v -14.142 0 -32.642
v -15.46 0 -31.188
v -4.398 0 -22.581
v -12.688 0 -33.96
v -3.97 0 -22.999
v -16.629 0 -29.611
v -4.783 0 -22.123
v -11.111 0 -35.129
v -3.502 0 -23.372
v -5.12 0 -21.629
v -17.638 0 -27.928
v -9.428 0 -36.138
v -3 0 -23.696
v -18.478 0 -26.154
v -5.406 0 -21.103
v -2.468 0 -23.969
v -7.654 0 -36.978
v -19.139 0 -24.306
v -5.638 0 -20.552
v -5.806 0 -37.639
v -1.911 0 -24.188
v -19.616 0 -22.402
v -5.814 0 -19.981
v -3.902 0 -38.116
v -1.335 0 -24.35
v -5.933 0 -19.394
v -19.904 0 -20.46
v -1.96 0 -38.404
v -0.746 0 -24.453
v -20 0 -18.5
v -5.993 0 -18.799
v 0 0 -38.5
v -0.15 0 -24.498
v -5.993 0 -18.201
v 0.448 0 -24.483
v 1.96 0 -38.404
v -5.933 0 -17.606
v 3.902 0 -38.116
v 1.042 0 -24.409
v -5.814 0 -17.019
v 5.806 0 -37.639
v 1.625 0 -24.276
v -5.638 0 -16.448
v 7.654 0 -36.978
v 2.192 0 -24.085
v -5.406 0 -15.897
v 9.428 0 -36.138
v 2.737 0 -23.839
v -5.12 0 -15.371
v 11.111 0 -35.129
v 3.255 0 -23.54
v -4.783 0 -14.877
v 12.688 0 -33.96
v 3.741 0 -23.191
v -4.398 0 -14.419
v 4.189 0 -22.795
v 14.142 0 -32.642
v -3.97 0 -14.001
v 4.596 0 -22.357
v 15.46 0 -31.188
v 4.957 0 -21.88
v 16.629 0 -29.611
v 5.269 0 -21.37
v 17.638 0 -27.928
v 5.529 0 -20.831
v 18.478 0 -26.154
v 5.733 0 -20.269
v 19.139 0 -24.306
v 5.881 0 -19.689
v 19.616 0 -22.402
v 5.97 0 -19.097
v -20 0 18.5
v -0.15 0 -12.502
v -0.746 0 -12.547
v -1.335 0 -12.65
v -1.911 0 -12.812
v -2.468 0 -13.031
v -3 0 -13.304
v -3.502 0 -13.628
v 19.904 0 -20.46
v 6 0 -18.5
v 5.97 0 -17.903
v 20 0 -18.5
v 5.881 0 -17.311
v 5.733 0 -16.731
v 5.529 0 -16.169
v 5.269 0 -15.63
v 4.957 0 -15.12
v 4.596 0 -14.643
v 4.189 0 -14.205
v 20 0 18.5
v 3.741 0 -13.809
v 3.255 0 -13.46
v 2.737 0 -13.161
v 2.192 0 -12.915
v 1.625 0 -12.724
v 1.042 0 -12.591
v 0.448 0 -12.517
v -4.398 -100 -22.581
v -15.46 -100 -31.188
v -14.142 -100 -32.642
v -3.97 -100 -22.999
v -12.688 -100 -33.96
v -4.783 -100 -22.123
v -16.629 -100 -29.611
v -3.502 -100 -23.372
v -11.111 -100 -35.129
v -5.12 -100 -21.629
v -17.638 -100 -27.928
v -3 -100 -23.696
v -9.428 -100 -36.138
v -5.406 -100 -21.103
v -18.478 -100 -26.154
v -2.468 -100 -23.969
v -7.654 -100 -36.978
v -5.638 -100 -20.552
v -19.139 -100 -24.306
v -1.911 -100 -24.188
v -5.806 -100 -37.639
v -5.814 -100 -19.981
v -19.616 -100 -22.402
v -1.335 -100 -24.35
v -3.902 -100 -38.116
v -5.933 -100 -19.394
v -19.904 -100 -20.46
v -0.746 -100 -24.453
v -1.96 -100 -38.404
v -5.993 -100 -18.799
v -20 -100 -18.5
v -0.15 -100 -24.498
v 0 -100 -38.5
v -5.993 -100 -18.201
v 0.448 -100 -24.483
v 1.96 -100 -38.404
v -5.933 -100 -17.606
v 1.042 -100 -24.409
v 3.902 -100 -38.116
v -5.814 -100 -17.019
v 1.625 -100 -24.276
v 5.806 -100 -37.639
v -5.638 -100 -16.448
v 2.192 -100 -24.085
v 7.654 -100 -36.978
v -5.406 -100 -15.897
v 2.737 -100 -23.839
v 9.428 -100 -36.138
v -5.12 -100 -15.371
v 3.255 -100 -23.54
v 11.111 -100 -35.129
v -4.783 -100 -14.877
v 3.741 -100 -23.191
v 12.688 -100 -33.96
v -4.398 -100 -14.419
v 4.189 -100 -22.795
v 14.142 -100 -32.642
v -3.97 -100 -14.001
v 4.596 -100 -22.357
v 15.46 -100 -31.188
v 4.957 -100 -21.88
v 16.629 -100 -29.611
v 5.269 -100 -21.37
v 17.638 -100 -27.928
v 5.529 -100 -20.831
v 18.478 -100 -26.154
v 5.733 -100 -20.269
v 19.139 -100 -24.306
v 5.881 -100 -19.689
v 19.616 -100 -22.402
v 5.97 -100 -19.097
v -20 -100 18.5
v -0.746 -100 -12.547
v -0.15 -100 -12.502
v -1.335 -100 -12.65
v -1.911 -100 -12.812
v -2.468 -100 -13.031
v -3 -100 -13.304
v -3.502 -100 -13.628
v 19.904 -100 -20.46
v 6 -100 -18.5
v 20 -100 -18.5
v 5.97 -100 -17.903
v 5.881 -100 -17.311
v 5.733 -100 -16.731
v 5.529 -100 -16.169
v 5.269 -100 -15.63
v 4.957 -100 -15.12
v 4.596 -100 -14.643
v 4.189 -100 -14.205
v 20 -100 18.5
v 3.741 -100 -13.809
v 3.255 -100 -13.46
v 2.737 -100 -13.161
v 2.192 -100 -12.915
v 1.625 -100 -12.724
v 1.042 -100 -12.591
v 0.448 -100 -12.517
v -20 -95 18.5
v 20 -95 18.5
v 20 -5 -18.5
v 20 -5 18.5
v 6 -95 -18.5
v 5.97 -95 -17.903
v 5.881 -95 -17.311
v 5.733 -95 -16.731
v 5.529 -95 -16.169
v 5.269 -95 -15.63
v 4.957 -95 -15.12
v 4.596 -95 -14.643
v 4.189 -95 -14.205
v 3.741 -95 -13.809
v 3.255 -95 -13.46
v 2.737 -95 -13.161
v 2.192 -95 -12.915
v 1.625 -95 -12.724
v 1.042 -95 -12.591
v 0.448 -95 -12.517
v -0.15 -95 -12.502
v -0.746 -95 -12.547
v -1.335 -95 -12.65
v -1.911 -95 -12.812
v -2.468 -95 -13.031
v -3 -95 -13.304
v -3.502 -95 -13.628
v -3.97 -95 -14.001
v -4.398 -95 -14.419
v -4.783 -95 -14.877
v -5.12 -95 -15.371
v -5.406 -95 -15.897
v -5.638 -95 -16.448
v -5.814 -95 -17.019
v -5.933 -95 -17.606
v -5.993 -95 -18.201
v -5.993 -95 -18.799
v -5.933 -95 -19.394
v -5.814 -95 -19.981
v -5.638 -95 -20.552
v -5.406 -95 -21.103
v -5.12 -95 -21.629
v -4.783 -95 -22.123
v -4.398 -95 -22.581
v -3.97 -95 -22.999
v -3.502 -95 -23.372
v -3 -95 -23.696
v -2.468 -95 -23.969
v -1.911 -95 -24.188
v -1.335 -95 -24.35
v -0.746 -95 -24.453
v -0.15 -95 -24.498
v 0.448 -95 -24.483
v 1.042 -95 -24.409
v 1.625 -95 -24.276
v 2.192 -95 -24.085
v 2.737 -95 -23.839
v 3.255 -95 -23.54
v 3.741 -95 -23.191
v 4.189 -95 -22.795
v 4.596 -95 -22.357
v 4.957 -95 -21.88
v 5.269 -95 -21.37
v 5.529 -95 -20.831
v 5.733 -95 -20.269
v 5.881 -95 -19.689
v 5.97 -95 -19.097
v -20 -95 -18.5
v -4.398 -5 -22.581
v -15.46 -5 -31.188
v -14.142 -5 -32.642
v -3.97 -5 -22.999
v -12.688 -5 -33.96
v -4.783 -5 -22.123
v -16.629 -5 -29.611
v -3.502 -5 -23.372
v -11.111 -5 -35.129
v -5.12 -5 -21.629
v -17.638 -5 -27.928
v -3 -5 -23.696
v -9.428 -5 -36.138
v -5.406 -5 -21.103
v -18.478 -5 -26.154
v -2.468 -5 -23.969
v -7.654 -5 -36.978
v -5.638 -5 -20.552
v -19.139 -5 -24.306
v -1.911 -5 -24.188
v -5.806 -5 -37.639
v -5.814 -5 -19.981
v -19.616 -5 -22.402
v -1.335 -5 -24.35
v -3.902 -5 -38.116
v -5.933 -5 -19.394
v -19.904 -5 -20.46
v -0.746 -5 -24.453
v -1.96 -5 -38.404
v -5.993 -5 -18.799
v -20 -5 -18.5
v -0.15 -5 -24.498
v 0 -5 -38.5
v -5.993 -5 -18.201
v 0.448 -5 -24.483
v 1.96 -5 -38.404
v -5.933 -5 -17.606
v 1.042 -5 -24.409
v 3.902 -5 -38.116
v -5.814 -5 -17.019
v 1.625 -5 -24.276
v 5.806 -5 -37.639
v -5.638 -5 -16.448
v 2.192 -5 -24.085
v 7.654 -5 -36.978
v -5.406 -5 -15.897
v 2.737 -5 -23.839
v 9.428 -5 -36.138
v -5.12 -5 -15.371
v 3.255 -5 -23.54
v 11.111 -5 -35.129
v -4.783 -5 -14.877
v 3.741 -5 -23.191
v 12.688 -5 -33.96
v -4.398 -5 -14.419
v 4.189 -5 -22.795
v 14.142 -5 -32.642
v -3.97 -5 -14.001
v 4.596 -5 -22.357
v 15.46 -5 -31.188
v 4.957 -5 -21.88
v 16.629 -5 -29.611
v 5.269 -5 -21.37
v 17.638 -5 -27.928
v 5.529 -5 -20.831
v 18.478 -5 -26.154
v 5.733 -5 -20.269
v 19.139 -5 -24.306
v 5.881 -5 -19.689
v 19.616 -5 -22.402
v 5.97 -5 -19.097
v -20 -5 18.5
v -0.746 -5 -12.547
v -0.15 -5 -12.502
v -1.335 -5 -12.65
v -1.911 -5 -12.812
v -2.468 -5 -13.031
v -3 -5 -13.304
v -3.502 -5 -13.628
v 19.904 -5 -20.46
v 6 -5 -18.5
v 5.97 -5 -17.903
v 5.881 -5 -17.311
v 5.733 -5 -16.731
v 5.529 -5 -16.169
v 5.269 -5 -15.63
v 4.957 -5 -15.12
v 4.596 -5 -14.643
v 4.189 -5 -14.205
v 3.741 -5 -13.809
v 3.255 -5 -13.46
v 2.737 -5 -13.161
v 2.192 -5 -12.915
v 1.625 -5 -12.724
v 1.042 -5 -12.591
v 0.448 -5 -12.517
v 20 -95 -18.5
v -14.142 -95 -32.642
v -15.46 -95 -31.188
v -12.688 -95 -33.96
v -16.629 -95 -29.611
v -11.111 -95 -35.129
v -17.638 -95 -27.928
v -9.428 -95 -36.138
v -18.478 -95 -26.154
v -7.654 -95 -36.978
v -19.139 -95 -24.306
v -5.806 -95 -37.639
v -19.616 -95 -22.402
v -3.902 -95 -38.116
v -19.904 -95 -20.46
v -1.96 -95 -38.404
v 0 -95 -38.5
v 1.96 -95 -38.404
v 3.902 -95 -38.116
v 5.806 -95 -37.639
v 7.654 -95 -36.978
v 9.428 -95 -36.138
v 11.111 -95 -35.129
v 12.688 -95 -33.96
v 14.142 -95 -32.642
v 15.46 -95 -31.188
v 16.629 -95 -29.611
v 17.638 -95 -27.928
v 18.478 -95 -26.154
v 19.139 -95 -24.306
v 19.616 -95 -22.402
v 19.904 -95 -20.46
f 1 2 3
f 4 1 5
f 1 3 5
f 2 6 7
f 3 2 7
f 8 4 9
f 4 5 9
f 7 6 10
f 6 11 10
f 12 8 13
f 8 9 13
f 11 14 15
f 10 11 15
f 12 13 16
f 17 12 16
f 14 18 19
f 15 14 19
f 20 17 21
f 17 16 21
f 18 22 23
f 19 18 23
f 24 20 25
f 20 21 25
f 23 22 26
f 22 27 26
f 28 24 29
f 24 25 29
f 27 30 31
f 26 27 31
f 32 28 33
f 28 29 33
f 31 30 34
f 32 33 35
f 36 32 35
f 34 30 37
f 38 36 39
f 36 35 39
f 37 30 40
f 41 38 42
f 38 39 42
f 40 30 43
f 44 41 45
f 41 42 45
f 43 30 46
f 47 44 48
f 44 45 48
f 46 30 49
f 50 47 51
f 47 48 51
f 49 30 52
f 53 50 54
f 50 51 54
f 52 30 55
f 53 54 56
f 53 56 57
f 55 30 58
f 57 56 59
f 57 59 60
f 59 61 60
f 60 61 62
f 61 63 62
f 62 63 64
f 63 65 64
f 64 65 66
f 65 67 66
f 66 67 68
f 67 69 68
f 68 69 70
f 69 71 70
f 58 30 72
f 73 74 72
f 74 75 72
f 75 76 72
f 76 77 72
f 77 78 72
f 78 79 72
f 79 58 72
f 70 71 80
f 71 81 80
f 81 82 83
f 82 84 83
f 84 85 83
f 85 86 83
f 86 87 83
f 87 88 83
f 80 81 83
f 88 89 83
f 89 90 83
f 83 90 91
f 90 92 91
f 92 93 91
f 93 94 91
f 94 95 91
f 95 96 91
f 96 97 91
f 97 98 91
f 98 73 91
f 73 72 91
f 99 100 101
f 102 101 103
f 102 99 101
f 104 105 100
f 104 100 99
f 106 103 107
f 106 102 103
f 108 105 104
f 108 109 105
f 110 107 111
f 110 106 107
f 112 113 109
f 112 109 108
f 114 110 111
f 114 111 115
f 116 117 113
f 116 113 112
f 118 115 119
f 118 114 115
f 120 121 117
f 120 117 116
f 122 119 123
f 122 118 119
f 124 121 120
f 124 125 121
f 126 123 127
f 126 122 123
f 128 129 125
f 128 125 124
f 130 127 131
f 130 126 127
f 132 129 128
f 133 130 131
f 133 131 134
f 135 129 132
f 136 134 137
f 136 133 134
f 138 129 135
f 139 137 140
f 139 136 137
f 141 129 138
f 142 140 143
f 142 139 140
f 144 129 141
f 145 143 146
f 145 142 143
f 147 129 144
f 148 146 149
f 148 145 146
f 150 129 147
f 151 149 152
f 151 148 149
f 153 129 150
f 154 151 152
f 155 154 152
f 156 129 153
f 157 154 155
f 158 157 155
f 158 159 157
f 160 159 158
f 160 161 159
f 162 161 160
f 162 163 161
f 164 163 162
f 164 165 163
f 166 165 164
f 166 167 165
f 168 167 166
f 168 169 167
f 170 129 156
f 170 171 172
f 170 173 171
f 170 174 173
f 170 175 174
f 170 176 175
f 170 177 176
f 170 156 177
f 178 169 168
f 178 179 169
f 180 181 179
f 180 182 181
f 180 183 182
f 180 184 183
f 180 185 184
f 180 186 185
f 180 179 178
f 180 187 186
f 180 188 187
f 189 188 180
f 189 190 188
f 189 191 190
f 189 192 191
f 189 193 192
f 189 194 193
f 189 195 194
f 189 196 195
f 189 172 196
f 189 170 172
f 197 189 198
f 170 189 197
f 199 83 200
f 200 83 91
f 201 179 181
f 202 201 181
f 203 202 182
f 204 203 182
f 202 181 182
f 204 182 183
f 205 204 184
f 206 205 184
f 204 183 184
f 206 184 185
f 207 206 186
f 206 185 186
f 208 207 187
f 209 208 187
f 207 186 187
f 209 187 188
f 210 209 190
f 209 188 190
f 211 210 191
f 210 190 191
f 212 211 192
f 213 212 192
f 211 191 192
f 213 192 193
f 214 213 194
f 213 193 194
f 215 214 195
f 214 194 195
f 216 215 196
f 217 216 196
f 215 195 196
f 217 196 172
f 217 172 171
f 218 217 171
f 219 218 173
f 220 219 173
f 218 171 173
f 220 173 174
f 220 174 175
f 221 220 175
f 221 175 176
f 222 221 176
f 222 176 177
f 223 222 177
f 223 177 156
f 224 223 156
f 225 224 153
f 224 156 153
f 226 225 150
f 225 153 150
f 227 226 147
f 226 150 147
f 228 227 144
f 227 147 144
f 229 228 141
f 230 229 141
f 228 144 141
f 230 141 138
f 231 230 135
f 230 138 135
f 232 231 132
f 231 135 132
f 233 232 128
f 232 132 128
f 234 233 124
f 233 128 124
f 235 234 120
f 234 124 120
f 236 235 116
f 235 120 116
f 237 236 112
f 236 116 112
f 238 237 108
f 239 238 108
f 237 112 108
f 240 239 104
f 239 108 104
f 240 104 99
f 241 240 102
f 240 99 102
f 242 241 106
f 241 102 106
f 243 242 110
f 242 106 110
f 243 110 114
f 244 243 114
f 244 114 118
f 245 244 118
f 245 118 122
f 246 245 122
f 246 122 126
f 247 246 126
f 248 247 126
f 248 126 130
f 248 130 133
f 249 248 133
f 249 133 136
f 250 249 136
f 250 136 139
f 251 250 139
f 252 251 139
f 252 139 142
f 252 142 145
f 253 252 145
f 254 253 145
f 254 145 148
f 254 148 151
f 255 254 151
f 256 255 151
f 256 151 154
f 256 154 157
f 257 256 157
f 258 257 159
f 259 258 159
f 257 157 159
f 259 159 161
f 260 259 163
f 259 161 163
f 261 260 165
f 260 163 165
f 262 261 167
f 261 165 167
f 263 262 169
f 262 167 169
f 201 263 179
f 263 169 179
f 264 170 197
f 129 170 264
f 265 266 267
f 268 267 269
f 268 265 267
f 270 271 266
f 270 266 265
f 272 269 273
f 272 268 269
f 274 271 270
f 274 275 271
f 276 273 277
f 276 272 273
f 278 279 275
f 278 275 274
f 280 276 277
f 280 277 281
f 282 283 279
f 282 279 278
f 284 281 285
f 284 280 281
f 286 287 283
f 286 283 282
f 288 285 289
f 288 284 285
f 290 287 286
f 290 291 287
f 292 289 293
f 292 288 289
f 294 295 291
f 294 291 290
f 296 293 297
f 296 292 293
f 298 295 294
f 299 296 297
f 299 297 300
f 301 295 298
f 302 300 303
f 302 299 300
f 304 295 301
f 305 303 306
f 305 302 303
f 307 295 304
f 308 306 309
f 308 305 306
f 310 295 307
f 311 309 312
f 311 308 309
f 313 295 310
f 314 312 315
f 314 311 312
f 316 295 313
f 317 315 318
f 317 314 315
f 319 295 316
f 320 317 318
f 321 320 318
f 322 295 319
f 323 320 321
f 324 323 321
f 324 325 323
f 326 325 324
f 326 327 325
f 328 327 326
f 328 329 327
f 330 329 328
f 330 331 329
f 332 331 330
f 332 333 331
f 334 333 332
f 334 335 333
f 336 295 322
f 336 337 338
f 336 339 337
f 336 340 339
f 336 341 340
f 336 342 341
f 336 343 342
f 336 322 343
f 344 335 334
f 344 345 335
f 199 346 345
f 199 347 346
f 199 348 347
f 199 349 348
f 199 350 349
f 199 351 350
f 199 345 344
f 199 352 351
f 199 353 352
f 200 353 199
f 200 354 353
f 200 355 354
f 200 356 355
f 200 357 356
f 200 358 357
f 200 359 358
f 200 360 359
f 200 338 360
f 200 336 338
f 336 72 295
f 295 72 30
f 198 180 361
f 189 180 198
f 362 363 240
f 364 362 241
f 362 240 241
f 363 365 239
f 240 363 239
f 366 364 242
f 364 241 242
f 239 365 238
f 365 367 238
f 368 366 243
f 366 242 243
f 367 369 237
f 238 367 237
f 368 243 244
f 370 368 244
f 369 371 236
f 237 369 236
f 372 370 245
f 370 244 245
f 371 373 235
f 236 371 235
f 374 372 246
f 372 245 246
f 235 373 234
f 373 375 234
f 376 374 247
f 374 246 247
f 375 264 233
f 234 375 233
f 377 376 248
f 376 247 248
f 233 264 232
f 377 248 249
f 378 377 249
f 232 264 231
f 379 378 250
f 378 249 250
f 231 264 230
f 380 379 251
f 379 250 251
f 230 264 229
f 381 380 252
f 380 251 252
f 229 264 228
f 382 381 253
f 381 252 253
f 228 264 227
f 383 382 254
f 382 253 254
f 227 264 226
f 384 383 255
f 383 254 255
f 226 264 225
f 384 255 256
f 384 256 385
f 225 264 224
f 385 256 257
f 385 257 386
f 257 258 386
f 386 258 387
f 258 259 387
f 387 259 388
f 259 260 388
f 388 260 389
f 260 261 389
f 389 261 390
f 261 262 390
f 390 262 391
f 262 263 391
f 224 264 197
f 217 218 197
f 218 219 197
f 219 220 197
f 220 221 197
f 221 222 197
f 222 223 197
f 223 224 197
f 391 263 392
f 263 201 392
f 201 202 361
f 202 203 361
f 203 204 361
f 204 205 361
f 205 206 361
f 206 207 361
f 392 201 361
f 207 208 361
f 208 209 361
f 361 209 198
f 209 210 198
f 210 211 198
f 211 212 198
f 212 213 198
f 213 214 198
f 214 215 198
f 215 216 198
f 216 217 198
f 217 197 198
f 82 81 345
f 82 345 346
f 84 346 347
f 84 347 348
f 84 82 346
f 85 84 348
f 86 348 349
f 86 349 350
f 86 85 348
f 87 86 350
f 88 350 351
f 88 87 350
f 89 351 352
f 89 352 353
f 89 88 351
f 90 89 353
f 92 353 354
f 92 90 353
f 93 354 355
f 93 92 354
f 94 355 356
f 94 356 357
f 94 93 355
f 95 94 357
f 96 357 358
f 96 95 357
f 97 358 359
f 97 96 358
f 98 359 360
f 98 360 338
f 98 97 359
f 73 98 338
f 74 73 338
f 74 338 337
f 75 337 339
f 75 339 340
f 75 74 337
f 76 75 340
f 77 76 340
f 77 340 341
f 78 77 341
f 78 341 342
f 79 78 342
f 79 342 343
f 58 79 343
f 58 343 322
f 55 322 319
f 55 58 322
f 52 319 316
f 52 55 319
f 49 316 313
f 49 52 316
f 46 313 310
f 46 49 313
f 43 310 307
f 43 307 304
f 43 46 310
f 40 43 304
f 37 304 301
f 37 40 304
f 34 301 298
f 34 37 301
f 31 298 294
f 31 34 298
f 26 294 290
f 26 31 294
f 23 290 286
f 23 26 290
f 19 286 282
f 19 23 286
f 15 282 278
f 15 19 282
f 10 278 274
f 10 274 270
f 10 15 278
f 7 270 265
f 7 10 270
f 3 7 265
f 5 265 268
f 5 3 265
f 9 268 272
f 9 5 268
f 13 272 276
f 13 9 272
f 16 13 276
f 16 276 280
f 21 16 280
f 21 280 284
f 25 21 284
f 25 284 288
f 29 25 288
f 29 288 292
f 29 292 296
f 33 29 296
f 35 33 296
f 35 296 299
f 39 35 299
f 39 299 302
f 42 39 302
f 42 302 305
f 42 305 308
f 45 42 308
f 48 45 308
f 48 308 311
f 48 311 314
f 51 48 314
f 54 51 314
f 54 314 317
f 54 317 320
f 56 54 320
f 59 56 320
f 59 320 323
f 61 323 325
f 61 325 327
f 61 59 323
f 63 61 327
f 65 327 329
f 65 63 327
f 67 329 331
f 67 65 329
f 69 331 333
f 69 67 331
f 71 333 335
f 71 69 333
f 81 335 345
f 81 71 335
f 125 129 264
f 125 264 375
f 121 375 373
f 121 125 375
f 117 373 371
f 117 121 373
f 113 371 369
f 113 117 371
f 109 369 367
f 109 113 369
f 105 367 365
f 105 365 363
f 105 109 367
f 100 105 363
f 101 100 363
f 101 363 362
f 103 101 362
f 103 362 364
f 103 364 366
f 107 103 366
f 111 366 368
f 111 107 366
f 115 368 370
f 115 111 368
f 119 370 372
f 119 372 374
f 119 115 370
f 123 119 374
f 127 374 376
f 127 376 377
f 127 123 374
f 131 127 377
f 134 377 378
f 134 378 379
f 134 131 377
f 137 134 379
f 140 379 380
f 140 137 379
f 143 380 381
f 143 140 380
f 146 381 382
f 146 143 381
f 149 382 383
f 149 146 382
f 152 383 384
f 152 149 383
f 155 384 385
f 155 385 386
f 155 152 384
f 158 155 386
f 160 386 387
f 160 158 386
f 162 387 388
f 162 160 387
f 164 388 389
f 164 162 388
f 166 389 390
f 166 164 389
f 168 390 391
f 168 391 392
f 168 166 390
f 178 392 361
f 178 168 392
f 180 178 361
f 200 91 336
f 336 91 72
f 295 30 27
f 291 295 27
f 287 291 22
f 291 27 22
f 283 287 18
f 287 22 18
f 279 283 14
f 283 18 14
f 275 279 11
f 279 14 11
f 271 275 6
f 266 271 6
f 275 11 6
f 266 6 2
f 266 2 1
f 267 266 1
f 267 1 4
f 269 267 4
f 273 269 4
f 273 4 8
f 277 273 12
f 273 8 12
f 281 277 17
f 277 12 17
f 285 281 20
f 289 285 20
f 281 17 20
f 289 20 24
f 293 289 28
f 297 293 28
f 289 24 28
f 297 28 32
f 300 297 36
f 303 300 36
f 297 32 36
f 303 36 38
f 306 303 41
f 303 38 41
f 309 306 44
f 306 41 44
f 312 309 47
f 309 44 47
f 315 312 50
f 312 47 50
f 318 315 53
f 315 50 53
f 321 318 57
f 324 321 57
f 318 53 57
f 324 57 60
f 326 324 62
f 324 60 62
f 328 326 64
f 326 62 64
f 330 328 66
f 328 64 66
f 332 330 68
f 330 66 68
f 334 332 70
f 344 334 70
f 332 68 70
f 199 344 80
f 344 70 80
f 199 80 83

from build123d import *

# Parameters (mm, degrees)
F0_R     = 6
F1_DEPTH = 5


with BuildPart() as f1:
    # F0 (on Front) → F1 (new body)
    with BuildSketch(Plane.XZ):
        with BuildLine():
            Line((20, -18.5), (20, 18.5))
            Line((20, 18.5), (-20, 18.5))
            Line((-20, 18.5), (-20, -18.5))
            ThreePointArc((-20, -18.5), (0, -38.5), (20, -18.5))
        make_face()
        with Locations((0, -18.5)):
            Circle(F0_R, mode=Mode.SUBTRACT)
    extrude(amount=F1_DEPTH)


with BuildPart() as f3_1:
    # F3: instance of F1
    add(f1.part.mirror(Plane.XZ.offset(50)))


solid = Compound([f1.part, f3_1.part])
